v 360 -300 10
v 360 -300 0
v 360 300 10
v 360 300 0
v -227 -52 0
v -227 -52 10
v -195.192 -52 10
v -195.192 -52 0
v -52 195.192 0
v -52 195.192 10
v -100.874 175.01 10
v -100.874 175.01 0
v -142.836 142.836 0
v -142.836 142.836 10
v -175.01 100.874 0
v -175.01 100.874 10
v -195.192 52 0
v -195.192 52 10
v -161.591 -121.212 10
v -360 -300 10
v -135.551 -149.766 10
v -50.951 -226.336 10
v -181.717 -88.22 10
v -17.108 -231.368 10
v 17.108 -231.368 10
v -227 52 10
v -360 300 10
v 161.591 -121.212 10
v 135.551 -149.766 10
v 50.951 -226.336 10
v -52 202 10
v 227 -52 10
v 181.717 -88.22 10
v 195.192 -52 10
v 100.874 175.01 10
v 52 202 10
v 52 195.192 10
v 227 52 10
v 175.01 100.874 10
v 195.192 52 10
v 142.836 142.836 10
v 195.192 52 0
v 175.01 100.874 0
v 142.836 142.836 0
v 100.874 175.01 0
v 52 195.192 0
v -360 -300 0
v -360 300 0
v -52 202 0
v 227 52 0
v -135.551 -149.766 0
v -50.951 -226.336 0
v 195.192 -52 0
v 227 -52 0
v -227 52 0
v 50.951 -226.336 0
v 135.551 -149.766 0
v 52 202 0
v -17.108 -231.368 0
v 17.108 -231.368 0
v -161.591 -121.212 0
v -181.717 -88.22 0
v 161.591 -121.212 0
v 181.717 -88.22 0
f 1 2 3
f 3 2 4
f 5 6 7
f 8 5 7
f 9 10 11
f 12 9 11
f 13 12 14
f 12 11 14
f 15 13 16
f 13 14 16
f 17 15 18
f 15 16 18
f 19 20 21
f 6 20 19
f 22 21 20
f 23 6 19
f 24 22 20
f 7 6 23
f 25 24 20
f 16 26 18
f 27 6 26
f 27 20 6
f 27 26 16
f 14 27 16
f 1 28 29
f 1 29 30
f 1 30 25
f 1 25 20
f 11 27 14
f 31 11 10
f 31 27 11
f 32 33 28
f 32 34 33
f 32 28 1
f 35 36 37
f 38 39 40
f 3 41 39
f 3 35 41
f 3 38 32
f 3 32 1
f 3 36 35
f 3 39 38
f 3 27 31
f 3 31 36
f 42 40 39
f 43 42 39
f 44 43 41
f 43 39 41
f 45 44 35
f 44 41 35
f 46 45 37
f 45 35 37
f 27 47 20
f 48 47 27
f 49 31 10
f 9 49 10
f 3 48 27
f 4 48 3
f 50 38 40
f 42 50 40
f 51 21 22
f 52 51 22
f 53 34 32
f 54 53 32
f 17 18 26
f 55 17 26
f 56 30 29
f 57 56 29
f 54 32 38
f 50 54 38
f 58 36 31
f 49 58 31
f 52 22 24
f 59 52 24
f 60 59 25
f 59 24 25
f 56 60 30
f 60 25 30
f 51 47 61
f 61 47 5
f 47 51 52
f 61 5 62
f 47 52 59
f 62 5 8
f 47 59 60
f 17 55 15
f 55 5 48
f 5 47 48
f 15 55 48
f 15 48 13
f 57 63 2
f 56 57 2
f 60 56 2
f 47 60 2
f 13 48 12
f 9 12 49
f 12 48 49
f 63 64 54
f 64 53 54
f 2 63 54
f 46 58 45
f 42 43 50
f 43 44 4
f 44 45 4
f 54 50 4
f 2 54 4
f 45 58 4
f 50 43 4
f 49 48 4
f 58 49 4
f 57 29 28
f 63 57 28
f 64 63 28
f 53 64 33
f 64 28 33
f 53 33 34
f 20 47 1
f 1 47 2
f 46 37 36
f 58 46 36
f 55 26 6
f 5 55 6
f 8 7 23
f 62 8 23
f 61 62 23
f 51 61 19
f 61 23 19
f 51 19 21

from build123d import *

# Parameters (mm, degrees)
SKETCH_1_W          = 720
SKETCH_1_H          = 600
EXTRUDE_1_DEPTH     = 10
CUT_EXTRUDE_2_DEPTH = 469.72166581


with BuildPart() as part:
    # 草圖1 → 填料-伸長1 (new body)
    with BuildSketch(Plane.XY):
        Rectangle(SKETCH_1_W, SKETCH_1_H)
    extrude(amount=EXTRUDE_1_DEPTH)

    # 草圖2 → 除料-伸長2 (cut, through all)
    with BuildSketch(Plane.XY.offset(10)):
        with BuildLine():
            Line((-227, -52), (-195.192212959, -52))
            ThreePointArc((-195.192212959, -52), (-195.455703203, -51.000667501), (-195.714077164, -50))
            Line((-195.714077164, -50), (-225, -50))
            Line((-225, -50), (-225, 50))
            Line((-225, 50), (-195.714077164, 50))
            ThreePointArc((-195.714077164, 50), (-195.455703203, 51.000667501), (-195.192212959, 52))
            Line((-195.192212959, 52), (-227, 52))
            Line((-227, 52), (-227, -52))
        make_face()
        with BuildLine():
            Line((-225, -50), (-195.714077164, -50))
            ThreePointArc((-195.714077164, -50), (-202, 0), (-195.714077164, 50))
            Line((-195.714077164, 50), (-225, 50))
            Line((-225, 50), (-225, -50))
        make_face()
        with BuildLine():
            ThreePointArc((-193.64916731, 50), (-200, 0), (-193.64916731, -50))
            Line((-193.64916731, -50), (-125, -50))
            Line((-125, -50), (-125, 50))
            Line((-125, 50), (-193.64916731, 50))
        make_face()
        with BuildLine():
            ThreePointArc((-195.714077164, 50), (-202, 0), (-195.714077164, -50))
            Line((-195.714077164, -50), (-193.64916731, -50))
            ThreePointArc((-193.64916731, -50), (-200, 0), (-193.64916731, 50))
            Line((-193.64916731, 50), (-195.714077164, 50))
        make_face()
        with BuildLine():
            ThreePointArc((-193.64916731, 50), (-193.388030784, 51.000681851), (-193.121723273, 52))
            Line((-193.121723273, 52), (-195.192212959, 52))
            ThreePointArc((-195.192212959, 52), (-195.455703203, 51.000667501), (-195.714077164, 50))
            Line((-195.714077164, 50), (-193.64916731, 50))
        make_face()
        with BuildLine():
            ThreePointArc((-193.121723273, 52), (-141.421356237, 141.421356237), (-52, 193.121723273))
            Line((-52, 193.121723273), (-52, 195.192212959))
            ThreePointArc((-52, 195.192212959), (-142.8355698, 142.8355698), (-195.192212959, 52))
            Line((-195.192212959, 52), (-193.121723273, 52))
        make_face()
        with BuildLine():
            ThreePointArc((134.208828858, -148.283479378), (170.598797446, -104.384147791), (193.121723273, -52))
            Line((193.121723273, -52), (123, -52))
            Line((123, -52), (123, 52))
            Line((123, 52), (193.121723273, 52))
            ThreePointArc((193.121723273, 52), (141.421356237, 141.421356237), (52, 193.121723273))
            Line((52, 193.121723273), (52, 98))
            Line((52, 98), (-52, 98))
            Line((-52, 98), (-52, 193.121723273))
            ThreePointArc((-52, 193.121723273), (-141.421356237, 141.421356237), (-193.121723273, 52))
            Line((-193.121723273, 52), (-123, 52))
            Line((-123, 52), (-123, -52))
            Line((-123, -52), (-193.121723273, -52))
            ThreePointArc((-193.121723273, -52), (-170.598797446, -104.384147791), (-134.208828858, -148.283479378))
            Line((-134.208828858, -148.283479378), (-50, -224.499443206))
            ThreePointArc((-50, -224.499443206), (0, -230), (50, -224.499443206))
            Line((50, -224.499443206), (134.208828858, -148.283479378))
        make_face()
        with BuildLine():
            ThreePointArc((-193.64916731, -50), (-193.388030784, -51.000681851), (-193.121723273, -52))
            Line((-193.121723273, -52), (-123, -52))
            Line((-123, -52), (-123, 52))
            Line((-123, 52), (-193.121723273, 52))
            ThreePointArc((-193.121723273, 52), (-193.388030784, 51.000681851), (-193.64916731, 50))
            Line((-193.64916731, 50), (-125, 50))
            Line((-125, 50), (-125, -50))
            Line((-125, -50), (-193.64916731, -50))
        make_face()
        with BuildLine():
            Line((50, 100), (50, 193.64916731))
            ThreePointArc((50, 193.64916731), (25.200858902, 198.405939202), (8.18e-07, 200))
            ThreePointArc((8.18e-07, 200), (-25.200858091, 198.405939305), (-50, 193.64916731))
            Line((-50, 193.64916731), (-50, 100))
            Line((-50, 100), (50, 100))
        make_face()
        with BuildLine():
            Line((52, 98), (52, 193.121723273))
            ThreePointArc((52, 193.121723273), (51.000681851, 193.388030784), (50, 193.64916731))
            Line((50, 193.64916731), (50, 100))
            Line((50, 100), (-50, 100))
            Line((-50, 100), (-50, 193.64916731))
            ThreePointArc((-50, 193.64916731), (-51.000681851, 193.388030784), (-52, 193.121723273))
            Line((-52, 193.121723273), (-52, 98))
            Line((-52, 98), (52, 98))
        make_face()
        with BuildLine():
            ThreePointArc((-50, 195.714077164), (-39.236011871, 198.152808137), (-28.354893758, 200))
            Line((-28.354893758, 200), (-50, 200))
            Line((-50, 200), (-50, 195.714077164))
        make_face()
        with BuildLine():
            ThreePointArc((-28.354893758, 200), (-14.212670404, 201.499379652), (0, 202))
            Line((0, 202), (-52, 202))
            Line((-52, 202), (-52, 195.192212959))
            ThreePointArc((-52, 195.192212959), (-51.000667501, 195.455703203), (-50, 195.714077164))
            Line((-50, 195.714077164), (-50, 200))
            Line((-50, 200), (-28.354893758, 200))
        make_face()
        with BuildLine():
            Line((-52, 195.192212959), (-52, 193.121723273))
            ThreePointArc((-52, 193.121723273), (-51.000681851, 193.388030784), (-50, 193.64916731))
            Line((-50, 193.64916731), (-50, 195.714077164))
            ThreePointArc((-50, 195.714077164), (-51.000667501, 195.455703203), (-52, 195.192212959))
        make_face()
        with BuildLine():
            ThreePointArc((-50, 193.64916731), (-25.200858091, 198.405939305), (8.18e-07, 200))
            Line((8.18e-07, 200), (-28.354893758, 200))
            ThreePointArc((-28.354893758, 200), (-39.236011871, 198.152808137), (-50, 195.714077164))
            Line((-50, 195.714077164), (-50, 193.64916731))
        make_face()
        with BuildLine():
            ThreePointArc((28.354893758, 200), (14.212670404, 201.499379652), (0, 202))
            ThreePointArc((0, 202), (-14.212670404, 201.499379652), (-28.354893758, 200))
            Line((-28.354893758, 200), (8.18e-07, 200))
            Line((8.18e-07, 200), (28.354893758, 200))
        make_face()
        with BuildLine():
            ThreePointArc((50, 195.714077164), (51.000667501, 195.455703203), (52, 195.192212959))
            Line((52, 195.192212959), (52, 202))
            Line((52, 202), (0, 202))
            ThreePointArc((0, 202), (14.212670404, 201.499379652), (28.354893758, 200))
            Line((28.354893758, 200), (50, 200))
            Line((50, 200), (50, 195.714077164))
        make_face()
        with BuildLine():
            Line((50, 193.64916731), (50, 195.714077164))
            ThreePointArc((50, 195.714077164), (39.236011871, 198.152808137), (28.354893758, 200))
            Line((28.354893758, 200), (8.18e-07, 200))
            ThreePointArc((8.18e-07, 200), (25.200858902, 198.405939202), (50, 193.64916731))
        make_face()
        with BuildLine():
            ThreePointArc((28.354893758, 200), (39.236011871, 198.152808137), (50, 195.714077164))
            Line((50, 195.714077164), (50, 200))
            Line((50, 200), (28.354893758, 200))
        make_face()
        with BuildLine():
            Line((52, 193.121723273), (52, 195.192212959))
            ThreePointArc((52, 195.192212959), (51.000667501, 195.455703203), (50, 195.714077164))
            Line((50, 195.714077164), (50, 193.64916731))
            ThreePointArc((50, 193.64916731), (51.000681851, 193.388030784), (52, 193.121723273))
        make_face()
        with BuildLine():
            Line((193.121723273, 52), (195.192212959, 52))
            ThreePointArc((195.192212959, 52), (142.8355698, 142.8355698), (52, 195.192212959))
            Line((52, 195.192212959), (52, 193.121723273))
            ThreePointArc((52, 193.121723273), (141.421356237, 141.421356237), (193.121723273, 52))
        make_face()
        with BuildLine():
            Line((125, -50), (193.64916731, -50))
            ThreePointArc((193.64916731, -50), (200, 0), (193.64916731, 50))
            Line((193.64916731, 50), (125, 50))
            Line((125, 50), (125, -50))
        make_face()
        with BuildLine():
            ThreePointArc((193.121723273, -52), (193.388030784, -51.000681851), (193.64916731, -50))
            Line((193.64916731, -50), (125, -50))
            Line((125, -50), (125, 50))
            Line((125, 50), (193.64916731, 50))
            ThreePointArc((193.64916731, 50), (193.388030784, 51.000681851), (193.121723273, 52))
            Line((193.121723273, 52), (123, 52))
            Line((123, 52), (123, -52))
            Line((123, -52), (193.121723273, -52))
        make_face()
        with BuildLine():
            Line((195.714077164, -50), (225, -50))
            Line((225, -50), (225, 50))
            Line((225, 50), (195.714077164, 50))
            ThreePointArc((195.714077164, 50), (202, 0), (195.714077164, -50))
        make_face()
        with BuildLine():
            Line((193.64916731, -50), (195.714077164, -50))
            ThreePointArc((195.714077164, -50), (202, 0), (195.714077164, 50))
            Line((195.714077164, 50), (193.64916731, 50))
            ThreePointArc((193.64916731, 50), (200, 0), (193.64916731, -50))
        make_face()
        with BuildLine():
            Line((193.64916731, 50), (195.714077164, 50))
            ThreePointArc((195.714077164, 50), (195.455703203, 51.000667501), (195.192212959, 52))
            Line((195.192212959, 52), (193.121723273, 52))
            ThreePointArc((193.121723273, 52), (193.388030784, 51.000681851), (193.64916731, 50))
        make_face()
        with BuildLine():
            Line((225, 50), (225, -50))
            Line((225, -50), (195.714077164, -50))
            ThreePointArc((195.714077164, -50), (195.455703203, -51.000667501), (195.192212959, -52))
            Line((195.192212959, -52), (227, -52))
            Line((227, -52), (227, 52))
            Line((227, 52), (195.192212959, 52))
            ThreePointArc((195.192212959, 52), (195.455703203, 51.000667501), (195.714077164, 50))
            Line((195.714077164, 50), (225, 50))
        make_face()
        with BuildLine():
            ThreePointArc((195.192212959, -52), (195.455703203, -51.000667501), (195.714077164, -50))
            Line((195.714077164, -50), (193.64916731, -50))
            ThreePointArc((193.64916731, -50), (193.388030784, -51.000681851), (193.121723273, -52))
            Line((193.121723273, -52), (195.192212959, -52))
        make_face()
        with BuildLine():
            ThreePointArc((135.550917147, -149.766314172), (172.445114674, -105.198300486), (195.192212959, -52))
            Line((195.192212959, -52), (193.121723273, -52))
            ThreePointArc((193.121723273, -52), (170.598797446, -104.384147791), (134.208828858, -148.283479378))
            Line((134.208828858, -148.283479378), (50, -224.499443206))
            ThreePointArc((50, -224.499443206), (0, -230), (-50, -224.499443206))
            Line((-50, -224.499443206), (-134.208828858, -148.283479378))
            ThreePointArc((-134.208828858, -148.283479378), (-170.598797446, -104.384147791), (-193.121723273, -52))
            Line((-193.121723273, -52), (-195.192212959, -52))
            ThreePointArc((-195.192212959, -52), (-172.445114674, -105.198300486), (-135.550917147, -149.766314172))
            Line((-135.550917147, -149.766314172), (-50.951325963, -226.335950266))
            ThreePointArc((-50.951325963, -226.335950266), (0, -232), (50.951325963, -226.335950266))
            Line((50.951325963, -226.335950266), (135.550917147, -149.766314172))
        make_face()
        with BuildLine():
            ThreePointArc((-195.714077164, -50), (-195.455703203, -51.000667501), (-195.192212959, -52))
            Line((-195.192212959, -52), (-193.121723273, -52))
            ThreePointArc((-193.121723273, -52), (-193.388030784, -51.000681851), (-193.64916731, -50))
            Line((-193.64916731, -50), (-195.714077164, -50))
        make_face()
    extrude(amount=-CUT_EXTRUDE_2_DEPTH, mode=Mode.SUBTRACT)


solid = part.part
